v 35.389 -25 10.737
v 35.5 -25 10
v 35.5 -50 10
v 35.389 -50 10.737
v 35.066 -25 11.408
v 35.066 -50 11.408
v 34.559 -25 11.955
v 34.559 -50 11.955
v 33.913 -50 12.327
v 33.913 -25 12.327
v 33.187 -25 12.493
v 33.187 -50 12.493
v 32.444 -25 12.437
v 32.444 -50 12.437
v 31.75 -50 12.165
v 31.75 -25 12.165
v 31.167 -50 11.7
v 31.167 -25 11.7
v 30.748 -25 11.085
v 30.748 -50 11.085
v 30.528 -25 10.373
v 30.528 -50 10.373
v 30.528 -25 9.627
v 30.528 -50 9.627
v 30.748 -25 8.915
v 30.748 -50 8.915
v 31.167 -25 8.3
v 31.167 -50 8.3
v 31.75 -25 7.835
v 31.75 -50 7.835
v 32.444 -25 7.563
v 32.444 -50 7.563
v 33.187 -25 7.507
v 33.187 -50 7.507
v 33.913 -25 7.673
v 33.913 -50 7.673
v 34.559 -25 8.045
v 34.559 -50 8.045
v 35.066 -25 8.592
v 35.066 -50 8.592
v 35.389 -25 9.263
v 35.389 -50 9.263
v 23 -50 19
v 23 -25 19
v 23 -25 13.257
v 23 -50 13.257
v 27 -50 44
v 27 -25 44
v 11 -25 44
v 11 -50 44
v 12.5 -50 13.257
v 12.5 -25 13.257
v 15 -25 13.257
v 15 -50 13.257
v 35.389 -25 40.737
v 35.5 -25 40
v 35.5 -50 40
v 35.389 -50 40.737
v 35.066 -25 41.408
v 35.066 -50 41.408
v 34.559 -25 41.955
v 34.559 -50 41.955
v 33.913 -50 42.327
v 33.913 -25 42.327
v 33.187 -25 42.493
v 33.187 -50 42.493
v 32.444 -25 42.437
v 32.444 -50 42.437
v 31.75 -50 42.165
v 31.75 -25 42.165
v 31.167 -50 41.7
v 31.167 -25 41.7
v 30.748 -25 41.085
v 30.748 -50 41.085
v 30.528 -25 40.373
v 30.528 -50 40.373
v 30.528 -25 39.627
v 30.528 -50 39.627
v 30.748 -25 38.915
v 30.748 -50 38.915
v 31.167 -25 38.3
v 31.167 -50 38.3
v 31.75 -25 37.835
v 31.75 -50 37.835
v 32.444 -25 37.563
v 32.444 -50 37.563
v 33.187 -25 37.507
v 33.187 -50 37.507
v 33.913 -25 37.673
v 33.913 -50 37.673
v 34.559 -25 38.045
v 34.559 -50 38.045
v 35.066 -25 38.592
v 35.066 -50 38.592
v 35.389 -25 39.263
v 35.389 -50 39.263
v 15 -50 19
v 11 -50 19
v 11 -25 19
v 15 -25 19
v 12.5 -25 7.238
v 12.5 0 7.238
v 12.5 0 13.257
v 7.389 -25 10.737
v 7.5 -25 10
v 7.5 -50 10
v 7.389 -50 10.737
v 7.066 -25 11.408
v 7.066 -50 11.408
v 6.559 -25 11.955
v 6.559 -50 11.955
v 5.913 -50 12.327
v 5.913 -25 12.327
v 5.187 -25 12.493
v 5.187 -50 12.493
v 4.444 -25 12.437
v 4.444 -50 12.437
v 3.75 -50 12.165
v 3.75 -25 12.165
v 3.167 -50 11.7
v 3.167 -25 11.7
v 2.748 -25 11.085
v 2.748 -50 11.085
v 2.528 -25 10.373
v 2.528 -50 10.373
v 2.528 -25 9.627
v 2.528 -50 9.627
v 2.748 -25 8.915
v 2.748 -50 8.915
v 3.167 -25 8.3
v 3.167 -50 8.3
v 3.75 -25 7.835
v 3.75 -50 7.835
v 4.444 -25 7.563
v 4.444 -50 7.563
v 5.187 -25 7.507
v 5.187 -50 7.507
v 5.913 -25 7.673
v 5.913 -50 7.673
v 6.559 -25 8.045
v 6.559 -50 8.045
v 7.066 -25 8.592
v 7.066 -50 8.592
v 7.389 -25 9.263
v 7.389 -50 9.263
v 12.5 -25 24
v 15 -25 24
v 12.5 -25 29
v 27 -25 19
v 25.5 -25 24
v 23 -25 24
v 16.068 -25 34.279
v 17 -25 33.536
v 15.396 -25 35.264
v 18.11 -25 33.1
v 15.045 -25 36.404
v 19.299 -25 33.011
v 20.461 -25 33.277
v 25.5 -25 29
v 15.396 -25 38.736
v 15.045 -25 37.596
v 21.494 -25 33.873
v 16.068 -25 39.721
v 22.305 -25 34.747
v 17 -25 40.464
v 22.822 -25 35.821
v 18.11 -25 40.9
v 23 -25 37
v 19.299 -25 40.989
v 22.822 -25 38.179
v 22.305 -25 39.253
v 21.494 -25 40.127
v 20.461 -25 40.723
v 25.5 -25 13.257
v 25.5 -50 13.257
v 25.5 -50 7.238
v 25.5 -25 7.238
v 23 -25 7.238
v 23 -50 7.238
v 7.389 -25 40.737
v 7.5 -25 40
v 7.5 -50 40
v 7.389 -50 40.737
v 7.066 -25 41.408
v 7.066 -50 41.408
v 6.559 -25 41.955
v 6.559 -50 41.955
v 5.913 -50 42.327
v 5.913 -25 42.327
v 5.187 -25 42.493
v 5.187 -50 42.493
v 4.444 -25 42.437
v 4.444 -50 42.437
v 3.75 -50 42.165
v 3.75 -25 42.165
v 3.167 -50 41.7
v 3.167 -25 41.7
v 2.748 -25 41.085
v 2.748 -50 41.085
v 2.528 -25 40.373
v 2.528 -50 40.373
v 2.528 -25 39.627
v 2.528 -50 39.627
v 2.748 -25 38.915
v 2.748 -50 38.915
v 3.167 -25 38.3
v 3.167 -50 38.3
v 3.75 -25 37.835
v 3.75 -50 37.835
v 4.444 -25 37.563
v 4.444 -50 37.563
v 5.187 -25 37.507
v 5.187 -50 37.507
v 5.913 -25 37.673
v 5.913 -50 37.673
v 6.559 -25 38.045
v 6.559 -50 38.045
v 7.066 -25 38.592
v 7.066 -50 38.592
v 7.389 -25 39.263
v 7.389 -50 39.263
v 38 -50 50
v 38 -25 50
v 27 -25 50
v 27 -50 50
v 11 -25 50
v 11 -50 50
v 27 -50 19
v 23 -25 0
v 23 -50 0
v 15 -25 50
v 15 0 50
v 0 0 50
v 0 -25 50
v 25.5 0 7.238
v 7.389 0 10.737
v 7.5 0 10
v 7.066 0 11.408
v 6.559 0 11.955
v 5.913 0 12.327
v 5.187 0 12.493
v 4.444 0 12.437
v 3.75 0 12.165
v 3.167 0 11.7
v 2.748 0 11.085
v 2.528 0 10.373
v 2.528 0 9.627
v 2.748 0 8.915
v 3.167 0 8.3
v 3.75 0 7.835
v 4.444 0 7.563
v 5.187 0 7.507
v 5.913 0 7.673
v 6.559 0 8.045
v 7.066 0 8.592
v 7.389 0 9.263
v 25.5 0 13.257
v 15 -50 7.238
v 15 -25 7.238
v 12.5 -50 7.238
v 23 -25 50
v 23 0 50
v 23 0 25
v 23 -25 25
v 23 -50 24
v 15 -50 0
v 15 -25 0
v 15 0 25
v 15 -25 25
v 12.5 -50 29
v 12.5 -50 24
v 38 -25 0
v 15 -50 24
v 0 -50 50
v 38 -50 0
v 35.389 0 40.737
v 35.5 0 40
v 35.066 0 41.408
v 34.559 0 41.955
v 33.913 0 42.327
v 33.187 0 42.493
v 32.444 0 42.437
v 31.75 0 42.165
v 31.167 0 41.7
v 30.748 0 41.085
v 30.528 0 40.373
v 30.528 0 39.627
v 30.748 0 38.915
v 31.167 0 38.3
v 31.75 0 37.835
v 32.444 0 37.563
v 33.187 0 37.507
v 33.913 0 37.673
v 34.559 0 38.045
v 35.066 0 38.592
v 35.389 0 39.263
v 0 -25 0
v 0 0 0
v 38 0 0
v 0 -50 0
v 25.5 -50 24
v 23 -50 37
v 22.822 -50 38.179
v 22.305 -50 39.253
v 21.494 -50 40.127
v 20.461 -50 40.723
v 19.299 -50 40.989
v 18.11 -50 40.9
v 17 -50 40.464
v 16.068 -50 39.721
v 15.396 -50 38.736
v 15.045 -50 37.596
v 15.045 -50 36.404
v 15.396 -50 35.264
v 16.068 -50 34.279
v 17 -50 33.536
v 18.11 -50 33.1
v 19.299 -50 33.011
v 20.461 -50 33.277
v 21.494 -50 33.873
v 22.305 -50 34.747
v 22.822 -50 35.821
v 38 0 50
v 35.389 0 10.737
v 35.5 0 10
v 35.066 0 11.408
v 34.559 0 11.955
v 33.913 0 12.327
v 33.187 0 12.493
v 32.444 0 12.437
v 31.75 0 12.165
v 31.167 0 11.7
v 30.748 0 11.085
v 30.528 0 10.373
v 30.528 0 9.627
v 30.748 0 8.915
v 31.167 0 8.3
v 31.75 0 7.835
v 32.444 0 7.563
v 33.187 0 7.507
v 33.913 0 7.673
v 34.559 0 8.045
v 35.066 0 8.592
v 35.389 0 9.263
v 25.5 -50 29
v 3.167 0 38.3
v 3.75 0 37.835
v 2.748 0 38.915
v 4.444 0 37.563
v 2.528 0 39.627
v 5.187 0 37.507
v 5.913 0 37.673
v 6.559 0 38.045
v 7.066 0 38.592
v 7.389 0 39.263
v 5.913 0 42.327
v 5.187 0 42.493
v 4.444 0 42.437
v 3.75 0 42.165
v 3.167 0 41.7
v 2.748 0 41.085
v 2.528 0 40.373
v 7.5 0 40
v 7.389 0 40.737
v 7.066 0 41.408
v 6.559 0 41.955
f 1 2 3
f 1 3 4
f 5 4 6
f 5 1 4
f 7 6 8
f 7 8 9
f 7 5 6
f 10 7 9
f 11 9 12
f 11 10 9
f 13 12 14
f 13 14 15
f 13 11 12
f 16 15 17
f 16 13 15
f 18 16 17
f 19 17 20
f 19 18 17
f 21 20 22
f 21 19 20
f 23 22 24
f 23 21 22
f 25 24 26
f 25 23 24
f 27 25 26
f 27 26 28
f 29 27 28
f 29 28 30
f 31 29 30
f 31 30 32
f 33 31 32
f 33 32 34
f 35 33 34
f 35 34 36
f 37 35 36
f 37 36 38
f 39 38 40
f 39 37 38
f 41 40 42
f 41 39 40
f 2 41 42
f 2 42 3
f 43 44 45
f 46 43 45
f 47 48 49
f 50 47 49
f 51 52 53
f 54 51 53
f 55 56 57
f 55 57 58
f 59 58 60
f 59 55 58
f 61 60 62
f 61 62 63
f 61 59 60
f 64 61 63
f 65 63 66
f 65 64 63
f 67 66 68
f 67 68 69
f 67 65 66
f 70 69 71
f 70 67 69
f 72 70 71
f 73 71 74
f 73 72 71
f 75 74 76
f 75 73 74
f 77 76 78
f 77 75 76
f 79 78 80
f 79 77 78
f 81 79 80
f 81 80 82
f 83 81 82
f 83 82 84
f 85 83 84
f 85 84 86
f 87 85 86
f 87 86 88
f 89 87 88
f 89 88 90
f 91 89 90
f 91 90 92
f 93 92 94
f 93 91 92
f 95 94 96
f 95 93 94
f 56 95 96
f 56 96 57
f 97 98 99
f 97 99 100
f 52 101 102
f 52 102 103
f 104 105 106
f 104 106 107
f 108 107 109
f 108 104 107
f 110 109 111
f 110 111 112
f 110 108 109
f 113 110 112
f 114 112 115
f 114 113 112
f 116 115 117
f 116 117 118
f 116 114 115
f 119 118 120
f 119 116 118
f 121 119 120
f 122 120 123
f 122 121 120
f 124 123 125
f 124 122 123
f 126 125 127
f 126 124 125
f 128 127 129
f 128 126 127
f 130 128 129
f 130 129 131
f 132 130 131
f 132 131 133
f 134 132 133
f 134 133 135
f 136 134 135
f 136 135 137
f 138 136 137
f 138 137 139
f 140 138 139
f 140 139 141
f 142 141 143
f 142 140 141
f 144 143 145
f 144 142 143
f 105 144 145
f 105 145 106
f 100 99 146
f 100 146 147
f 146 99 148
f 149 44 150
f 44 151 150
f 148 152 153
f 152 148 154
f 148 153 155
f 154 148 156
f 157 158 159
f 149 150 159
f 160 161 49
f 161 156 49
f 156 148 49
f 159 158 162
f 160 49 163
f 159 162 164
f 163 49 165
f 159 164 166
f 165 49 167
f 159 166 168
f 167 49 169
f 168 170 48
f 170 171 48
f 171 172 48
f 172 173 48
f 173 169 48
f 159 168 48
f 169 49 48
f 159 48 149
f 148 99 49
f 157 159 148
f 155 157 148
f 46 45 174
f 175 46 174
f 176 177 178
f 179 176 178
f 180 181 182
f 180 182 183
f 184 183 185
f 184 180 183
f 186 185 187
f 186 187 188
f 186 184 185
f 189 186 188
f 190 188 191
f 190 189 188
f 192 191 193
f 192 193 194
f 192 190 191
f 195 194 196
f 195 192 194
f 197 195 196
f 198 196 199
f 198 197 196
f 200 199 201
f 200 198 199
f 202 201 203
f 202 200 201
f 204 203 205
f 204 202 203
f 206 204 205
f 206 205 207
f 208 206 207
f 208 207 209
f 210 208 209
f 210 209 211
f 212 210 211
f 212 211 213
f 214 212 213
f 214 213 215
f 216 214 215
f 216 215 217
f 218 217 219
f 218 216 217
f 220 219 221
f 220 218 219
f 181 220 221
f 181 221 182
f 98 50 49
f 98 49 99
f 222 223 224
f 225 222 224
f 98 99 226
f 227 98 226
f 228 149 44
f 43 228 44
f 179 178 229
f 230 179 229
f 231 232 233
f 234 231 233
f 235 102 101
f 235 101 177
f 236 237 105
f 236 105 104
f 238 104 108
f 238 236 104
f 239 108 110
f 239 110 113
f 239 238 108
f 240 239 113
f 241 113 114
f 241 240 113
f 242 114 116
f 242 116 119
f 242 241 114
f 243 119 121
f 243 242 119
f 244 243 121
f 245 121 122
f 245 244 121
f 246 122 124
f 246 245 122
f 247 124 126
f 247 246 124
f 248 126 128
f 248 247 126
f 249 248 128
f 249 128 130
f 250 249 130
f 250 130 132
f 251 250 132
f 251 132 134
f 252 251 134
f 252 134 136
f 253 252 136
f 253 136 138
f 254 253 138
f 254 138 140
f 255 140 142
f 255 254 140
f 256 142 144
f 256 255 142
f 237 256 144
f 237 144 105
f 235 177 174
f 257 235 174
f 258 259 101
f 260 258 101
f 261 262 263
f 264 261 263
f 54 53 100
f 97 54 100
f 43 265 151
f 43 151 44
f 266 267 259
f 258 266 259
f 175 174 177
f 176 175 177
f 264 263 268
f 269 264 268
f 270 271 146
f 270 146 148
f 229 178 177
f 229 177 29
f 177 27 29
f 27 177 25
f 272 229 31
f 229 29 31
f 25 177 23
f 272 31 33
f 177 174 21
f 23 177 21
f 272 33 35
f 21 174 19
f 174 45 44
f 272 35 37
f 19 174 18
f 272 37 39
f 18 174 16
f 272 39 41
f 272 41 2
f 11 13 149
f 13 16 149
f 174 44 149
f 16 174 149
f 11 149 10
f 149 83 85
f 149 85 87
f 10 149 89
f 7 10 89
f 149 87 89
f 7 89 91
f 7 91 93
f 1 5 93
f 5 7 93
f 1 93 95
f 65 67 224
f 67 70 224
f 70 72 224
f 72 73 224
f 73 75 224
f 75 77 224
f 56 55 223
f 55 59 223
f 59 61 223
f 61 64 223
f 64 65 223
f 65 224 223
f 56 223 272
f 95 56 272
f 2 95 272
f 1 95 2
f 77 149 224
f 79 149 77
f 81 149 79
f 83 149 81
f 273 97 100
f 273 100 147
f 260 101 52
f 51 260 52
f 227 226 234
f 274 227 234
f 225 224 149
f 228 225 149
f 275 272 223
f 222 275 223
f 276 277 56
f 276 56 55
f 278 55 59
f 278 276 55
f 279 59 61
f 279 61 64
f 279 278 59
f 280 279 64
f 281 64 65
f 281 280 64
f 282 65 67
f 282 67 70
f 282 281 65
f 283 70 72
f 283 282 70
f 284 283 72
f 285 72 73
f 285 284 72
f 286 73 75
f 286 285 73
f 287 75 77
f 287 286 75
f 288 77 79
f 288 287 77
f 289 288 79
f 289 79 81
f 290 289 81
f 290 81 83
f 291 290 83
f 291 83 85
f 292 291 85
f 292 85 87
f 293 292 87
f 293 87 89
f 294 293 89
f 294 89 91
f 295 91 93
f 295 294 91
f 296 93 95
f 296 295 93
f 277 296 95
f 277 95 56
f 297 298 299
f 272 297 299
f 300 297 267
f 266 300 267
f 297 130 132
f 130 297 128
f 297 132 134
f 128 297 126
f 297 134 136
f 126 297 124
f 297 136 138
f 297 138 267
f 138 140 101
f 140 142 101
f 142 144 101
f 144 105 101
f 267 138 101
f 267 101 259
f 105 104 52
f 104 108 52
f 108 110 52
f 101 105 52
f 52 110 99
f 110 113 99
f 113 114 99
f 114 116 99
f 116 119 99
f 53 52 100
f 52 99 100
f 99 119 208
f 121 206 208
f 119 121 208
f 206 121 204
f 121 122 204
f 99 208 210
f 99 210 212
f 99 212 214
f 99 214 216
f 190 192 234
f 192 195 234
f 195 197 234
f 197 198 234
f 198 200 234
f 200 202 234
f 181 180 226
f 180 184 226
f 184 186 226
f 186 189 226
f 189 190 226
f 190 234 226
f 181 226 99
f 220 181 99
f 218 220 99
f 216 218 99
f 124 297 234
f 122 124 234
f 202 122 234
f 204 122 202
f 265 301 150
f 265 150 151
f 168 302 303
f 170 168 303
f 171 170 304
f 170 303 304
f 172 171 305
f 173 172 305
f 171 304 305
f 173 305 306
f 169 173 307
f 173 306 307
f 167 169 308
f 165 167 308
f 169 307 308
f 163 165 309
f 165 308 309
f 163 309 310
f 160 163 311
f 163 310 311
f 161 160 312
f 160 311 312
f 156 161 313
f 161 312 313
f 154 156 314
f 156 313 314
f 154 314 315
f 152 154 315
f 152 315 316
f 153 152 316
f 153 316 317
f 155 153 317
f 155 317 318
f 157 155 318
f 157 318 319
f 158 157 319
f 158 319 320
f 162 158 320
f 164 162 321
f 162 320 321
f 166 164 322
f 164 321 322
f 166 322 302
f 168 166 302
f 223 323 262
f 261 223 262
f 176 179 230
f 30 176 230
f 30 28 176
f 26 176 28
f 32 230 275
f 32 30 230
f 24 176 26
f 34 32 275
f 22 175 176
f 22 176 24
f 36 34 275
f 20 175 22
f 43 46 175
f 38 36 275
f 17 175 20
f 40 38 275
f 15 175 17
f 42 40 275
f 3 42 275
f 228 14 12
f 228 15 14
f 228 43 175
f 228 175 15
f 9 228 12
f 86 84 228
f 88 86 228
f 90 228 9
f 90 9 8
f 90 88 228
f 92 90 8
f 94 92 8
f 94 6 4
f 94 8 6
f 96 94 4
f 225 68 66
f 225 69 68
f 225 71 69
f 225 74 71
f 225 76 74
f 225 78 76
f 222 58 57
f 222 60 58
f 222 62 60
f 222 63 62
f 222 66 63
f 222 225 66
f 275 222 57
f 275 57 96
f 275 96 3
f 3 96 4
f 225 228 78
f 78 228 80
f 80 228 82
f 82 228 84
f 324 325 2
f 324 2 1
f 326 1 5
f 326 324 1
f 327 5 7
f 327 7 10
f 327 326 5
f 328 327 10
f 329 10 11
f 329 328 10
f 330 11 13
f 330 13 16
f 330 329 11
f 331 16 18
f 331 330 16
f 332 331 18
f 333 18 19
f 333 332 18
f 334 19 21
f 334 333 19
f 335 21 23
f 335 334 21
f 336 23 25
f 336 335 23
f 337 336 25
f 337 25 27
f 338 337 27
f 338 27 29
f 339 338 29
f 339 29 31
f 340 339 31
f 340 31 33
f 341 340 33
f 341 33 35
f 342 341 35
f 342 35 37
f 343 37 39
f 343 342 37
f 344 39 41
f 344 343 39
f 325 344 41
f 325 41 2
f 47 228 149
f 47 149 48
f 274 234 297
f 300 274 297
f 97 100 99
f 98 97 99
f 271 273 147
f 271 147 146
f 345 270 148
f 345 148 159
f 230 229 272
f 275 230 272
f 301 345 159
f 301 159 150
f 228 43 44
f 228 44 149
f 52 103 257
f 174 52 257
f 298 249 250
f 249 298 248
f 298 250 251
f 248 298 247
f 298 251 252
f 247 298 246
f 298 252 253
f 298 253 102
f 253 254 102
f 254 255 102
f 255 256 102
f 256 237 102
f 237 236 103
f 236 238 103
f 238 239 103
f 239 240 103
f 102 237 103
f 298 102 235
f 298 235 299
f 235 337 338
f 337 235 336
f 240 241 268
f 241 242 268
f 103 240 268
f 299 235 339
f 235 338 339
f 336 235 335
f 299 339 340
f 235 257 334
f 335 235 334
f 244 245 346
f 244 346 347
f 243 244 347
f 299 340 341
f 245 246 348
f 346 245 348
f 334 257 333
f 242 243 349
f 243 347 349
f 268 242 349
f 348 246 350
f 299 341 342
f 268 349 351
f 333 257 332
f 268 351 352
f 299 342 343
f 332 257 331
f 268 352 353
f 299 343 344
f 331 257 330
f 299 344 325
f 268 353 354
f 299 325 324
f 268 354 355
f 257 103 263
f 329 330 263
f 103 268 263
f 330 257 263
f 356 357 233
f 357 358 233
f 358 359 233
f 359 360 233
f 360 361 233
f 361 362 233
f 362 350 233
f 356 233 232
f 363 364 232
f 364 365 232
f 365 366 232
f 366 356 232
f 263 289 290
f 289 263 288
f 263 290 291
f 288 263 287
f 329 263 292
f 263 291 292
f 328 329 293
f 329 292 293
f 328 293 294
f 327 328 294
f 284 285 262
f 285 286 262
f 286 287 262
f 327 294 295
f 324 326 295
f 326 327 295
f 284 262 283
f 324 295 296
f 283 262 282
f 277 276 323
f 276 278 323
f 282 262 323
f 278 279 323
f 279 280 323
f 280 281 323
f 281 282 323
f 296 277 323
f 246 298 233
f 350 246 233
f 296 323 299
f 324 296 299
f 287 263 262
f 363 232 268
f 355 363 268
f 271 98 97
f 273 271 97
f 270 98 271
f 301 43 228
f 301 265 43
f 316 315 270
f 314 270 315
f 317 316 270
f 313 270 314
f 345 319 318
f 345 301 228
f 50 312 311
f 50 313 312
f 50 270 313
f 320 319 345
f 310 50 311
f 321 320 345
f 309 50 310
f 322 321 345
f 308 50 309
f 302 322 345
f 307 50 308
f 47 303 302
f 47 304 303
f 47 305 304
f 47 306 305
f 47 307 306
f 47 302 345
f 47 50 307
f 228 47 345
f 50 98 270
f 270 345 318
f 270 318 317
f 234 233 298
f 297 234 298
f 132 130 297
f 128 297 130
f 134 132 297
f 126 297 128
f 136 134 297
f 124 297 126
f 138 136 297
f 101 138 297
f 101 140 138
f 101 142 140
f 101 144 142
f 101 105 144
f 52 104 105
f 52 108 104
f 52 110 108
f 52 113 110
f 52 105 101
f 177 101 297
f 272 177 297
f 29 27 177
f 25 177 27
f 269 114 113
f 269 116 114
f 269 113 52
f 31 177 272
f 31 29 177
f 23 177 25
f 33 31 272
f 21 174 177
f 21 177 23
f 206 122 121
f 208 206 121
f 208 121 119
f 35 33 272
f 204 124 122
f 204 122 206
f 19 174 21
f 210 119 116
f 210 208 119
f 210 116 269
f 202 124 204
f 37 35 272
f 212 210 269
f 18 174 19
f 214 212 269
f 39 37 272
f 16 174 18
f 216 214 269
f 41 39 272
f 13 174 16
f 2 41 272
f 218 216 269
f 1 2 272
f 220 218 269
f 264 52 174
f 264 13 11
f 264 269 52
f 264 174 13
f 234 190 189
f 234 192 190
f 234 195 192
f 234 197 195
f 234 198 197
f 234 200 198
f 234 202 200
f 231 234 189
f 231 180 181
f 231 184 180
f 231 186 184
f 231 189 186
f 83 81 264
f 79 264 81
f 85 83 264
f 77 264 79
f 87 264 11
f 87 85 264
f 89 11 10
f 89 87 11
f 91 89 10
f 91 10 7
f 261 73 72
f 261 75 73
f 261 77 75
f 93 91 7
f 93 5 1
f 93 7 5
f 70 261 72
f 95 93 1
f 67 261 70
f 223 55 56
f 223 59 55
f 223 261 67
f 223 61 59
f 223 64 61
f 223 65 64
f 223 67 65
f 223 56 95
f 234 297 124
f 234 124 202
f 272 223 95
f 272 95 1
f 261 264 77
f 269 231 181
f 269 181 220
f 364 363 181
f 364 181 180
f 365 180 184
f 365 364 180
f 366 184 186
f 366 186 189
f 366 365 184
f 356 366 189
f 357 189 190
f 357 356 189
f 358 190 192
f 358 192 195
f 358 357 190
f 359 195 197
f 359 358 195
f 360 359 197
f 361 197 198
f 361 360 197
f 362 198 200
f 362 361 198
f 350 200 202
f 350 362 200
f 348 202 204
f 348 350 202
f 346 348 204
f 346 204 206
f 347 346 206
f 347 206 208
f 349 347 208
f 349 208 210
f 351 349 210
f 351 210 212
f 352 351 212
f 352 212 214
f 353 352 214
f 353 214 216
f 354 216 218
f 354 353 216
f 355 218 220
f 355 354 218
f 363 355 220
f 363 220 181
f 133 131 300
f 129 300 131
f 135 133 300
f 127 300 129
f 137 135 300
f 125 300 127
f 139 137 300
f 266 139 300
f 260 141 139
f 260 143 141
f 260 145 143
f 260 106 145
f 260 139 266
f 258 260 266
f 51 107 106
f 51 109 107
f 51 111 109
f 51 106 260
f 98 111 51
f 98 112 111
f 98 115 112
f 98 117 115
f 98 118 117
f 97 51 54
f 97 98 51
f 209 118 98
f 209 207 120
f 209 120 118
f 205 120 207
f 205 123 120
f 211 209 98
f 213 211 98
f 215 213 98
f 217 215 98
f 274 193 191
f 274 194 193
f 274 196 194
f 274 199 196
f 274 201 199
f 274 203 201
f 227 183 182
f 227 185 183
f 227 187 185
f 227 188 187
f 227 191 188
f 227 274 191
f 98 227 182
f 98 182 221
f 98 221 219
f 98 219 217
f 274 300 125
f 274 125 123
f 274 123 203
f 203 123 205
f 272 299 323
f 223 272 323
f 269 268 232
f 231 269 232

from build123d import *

# Parameters (mm, degrees)
F0_R     = 2.5
F0_W     = 13
F0_H     = 6.019222
F1_DEPTH = 25
F2_R     = 2.5
F3_DEPTH = 25
F4_R     = 4
F5_DEPTH = 25


with BuildPart() as f1:
    # F0 (on Front) → F1 (new body)
    with BuildSketch(Plane.XZ):
        Polygon((0, 50), (0, 0), (38, 0), (38, 50), (23, 50), (23, 25), (15, 25), (15, 50), align=None)
        with Locations((5, 10)):
            Circle(F0_R, mode=Mode.SUBTRACT)
        with Locations((19, 10.247186)):
            Rectangle(F0_W, F0_H, mode=Mode.SUBTRACT)
        with Locations((33, 10)):
            Circle(F0_R, mode=Mode.SUBTRACT)
        with Locations((5, 40)):
            Circle(F0_R, mode=Mode.SUBTRACT)
        with Locations((33, 40)):
            Circle(F0_R, mode=Mode.SUBTRACT)
    extrude(amount=F1_DEPTH)


with BuildPart() as f3:
    # F2 (on face) → F3 (new body)
    with BuildSketch(Plane.XZ.offset(25)):
        Polygon((11, 19), (11, 50), (0, 50), (0, 0), (11, 0), (15, 0), (15, 7.237575), (12.5, 7.237575), (12.5, 13.256797), (15, 13.256797), (15, 19), align=None)
        with Locations((5, 10)):
            Circle(F2_R, mode=Mode.SUBTRACT)
        with Locations((5, 40)):
            Circle(F2_R, mode=Mode.SUBTRACT)
        Polygon((27, 0), (38, 0), (38, 50), (27, 50), (27, 19), (23, 19), (23, 13.256797), (25.5, 13.256797), (25.5, 7.237575), (23, 7.237575), (23, 0), align=None)
        with Locations((33, 10)):
            Circle(F2_R, mode=Mode.SUBTRACT)
        with Locations((33, 40)):
            Circle(F2_R, mode=Mode.SUBTRACT)
    extrude(amount=F3_DEPTH)


with BuildPart() as f5:
    # F4 (on face) → F5 (new body)
    with BuildSketch(Plane.XZ.offset(50)):
        Polygon((23, 19), (27, 19), (27, 44), (11, 44), (11, 19), (15, 19), (15, 24), (12.5, 24), (12.5, 29), (25.5, 29), (25.5, 24), (23, 24), align=None)
        with Locations((19, 37)):
            Circle(F4_R, mode=Mode.SUBTRACT)
    extrude(amount=-F5_DEPTH)


solid = Compound([f1.part, f3.part, f5.part])
